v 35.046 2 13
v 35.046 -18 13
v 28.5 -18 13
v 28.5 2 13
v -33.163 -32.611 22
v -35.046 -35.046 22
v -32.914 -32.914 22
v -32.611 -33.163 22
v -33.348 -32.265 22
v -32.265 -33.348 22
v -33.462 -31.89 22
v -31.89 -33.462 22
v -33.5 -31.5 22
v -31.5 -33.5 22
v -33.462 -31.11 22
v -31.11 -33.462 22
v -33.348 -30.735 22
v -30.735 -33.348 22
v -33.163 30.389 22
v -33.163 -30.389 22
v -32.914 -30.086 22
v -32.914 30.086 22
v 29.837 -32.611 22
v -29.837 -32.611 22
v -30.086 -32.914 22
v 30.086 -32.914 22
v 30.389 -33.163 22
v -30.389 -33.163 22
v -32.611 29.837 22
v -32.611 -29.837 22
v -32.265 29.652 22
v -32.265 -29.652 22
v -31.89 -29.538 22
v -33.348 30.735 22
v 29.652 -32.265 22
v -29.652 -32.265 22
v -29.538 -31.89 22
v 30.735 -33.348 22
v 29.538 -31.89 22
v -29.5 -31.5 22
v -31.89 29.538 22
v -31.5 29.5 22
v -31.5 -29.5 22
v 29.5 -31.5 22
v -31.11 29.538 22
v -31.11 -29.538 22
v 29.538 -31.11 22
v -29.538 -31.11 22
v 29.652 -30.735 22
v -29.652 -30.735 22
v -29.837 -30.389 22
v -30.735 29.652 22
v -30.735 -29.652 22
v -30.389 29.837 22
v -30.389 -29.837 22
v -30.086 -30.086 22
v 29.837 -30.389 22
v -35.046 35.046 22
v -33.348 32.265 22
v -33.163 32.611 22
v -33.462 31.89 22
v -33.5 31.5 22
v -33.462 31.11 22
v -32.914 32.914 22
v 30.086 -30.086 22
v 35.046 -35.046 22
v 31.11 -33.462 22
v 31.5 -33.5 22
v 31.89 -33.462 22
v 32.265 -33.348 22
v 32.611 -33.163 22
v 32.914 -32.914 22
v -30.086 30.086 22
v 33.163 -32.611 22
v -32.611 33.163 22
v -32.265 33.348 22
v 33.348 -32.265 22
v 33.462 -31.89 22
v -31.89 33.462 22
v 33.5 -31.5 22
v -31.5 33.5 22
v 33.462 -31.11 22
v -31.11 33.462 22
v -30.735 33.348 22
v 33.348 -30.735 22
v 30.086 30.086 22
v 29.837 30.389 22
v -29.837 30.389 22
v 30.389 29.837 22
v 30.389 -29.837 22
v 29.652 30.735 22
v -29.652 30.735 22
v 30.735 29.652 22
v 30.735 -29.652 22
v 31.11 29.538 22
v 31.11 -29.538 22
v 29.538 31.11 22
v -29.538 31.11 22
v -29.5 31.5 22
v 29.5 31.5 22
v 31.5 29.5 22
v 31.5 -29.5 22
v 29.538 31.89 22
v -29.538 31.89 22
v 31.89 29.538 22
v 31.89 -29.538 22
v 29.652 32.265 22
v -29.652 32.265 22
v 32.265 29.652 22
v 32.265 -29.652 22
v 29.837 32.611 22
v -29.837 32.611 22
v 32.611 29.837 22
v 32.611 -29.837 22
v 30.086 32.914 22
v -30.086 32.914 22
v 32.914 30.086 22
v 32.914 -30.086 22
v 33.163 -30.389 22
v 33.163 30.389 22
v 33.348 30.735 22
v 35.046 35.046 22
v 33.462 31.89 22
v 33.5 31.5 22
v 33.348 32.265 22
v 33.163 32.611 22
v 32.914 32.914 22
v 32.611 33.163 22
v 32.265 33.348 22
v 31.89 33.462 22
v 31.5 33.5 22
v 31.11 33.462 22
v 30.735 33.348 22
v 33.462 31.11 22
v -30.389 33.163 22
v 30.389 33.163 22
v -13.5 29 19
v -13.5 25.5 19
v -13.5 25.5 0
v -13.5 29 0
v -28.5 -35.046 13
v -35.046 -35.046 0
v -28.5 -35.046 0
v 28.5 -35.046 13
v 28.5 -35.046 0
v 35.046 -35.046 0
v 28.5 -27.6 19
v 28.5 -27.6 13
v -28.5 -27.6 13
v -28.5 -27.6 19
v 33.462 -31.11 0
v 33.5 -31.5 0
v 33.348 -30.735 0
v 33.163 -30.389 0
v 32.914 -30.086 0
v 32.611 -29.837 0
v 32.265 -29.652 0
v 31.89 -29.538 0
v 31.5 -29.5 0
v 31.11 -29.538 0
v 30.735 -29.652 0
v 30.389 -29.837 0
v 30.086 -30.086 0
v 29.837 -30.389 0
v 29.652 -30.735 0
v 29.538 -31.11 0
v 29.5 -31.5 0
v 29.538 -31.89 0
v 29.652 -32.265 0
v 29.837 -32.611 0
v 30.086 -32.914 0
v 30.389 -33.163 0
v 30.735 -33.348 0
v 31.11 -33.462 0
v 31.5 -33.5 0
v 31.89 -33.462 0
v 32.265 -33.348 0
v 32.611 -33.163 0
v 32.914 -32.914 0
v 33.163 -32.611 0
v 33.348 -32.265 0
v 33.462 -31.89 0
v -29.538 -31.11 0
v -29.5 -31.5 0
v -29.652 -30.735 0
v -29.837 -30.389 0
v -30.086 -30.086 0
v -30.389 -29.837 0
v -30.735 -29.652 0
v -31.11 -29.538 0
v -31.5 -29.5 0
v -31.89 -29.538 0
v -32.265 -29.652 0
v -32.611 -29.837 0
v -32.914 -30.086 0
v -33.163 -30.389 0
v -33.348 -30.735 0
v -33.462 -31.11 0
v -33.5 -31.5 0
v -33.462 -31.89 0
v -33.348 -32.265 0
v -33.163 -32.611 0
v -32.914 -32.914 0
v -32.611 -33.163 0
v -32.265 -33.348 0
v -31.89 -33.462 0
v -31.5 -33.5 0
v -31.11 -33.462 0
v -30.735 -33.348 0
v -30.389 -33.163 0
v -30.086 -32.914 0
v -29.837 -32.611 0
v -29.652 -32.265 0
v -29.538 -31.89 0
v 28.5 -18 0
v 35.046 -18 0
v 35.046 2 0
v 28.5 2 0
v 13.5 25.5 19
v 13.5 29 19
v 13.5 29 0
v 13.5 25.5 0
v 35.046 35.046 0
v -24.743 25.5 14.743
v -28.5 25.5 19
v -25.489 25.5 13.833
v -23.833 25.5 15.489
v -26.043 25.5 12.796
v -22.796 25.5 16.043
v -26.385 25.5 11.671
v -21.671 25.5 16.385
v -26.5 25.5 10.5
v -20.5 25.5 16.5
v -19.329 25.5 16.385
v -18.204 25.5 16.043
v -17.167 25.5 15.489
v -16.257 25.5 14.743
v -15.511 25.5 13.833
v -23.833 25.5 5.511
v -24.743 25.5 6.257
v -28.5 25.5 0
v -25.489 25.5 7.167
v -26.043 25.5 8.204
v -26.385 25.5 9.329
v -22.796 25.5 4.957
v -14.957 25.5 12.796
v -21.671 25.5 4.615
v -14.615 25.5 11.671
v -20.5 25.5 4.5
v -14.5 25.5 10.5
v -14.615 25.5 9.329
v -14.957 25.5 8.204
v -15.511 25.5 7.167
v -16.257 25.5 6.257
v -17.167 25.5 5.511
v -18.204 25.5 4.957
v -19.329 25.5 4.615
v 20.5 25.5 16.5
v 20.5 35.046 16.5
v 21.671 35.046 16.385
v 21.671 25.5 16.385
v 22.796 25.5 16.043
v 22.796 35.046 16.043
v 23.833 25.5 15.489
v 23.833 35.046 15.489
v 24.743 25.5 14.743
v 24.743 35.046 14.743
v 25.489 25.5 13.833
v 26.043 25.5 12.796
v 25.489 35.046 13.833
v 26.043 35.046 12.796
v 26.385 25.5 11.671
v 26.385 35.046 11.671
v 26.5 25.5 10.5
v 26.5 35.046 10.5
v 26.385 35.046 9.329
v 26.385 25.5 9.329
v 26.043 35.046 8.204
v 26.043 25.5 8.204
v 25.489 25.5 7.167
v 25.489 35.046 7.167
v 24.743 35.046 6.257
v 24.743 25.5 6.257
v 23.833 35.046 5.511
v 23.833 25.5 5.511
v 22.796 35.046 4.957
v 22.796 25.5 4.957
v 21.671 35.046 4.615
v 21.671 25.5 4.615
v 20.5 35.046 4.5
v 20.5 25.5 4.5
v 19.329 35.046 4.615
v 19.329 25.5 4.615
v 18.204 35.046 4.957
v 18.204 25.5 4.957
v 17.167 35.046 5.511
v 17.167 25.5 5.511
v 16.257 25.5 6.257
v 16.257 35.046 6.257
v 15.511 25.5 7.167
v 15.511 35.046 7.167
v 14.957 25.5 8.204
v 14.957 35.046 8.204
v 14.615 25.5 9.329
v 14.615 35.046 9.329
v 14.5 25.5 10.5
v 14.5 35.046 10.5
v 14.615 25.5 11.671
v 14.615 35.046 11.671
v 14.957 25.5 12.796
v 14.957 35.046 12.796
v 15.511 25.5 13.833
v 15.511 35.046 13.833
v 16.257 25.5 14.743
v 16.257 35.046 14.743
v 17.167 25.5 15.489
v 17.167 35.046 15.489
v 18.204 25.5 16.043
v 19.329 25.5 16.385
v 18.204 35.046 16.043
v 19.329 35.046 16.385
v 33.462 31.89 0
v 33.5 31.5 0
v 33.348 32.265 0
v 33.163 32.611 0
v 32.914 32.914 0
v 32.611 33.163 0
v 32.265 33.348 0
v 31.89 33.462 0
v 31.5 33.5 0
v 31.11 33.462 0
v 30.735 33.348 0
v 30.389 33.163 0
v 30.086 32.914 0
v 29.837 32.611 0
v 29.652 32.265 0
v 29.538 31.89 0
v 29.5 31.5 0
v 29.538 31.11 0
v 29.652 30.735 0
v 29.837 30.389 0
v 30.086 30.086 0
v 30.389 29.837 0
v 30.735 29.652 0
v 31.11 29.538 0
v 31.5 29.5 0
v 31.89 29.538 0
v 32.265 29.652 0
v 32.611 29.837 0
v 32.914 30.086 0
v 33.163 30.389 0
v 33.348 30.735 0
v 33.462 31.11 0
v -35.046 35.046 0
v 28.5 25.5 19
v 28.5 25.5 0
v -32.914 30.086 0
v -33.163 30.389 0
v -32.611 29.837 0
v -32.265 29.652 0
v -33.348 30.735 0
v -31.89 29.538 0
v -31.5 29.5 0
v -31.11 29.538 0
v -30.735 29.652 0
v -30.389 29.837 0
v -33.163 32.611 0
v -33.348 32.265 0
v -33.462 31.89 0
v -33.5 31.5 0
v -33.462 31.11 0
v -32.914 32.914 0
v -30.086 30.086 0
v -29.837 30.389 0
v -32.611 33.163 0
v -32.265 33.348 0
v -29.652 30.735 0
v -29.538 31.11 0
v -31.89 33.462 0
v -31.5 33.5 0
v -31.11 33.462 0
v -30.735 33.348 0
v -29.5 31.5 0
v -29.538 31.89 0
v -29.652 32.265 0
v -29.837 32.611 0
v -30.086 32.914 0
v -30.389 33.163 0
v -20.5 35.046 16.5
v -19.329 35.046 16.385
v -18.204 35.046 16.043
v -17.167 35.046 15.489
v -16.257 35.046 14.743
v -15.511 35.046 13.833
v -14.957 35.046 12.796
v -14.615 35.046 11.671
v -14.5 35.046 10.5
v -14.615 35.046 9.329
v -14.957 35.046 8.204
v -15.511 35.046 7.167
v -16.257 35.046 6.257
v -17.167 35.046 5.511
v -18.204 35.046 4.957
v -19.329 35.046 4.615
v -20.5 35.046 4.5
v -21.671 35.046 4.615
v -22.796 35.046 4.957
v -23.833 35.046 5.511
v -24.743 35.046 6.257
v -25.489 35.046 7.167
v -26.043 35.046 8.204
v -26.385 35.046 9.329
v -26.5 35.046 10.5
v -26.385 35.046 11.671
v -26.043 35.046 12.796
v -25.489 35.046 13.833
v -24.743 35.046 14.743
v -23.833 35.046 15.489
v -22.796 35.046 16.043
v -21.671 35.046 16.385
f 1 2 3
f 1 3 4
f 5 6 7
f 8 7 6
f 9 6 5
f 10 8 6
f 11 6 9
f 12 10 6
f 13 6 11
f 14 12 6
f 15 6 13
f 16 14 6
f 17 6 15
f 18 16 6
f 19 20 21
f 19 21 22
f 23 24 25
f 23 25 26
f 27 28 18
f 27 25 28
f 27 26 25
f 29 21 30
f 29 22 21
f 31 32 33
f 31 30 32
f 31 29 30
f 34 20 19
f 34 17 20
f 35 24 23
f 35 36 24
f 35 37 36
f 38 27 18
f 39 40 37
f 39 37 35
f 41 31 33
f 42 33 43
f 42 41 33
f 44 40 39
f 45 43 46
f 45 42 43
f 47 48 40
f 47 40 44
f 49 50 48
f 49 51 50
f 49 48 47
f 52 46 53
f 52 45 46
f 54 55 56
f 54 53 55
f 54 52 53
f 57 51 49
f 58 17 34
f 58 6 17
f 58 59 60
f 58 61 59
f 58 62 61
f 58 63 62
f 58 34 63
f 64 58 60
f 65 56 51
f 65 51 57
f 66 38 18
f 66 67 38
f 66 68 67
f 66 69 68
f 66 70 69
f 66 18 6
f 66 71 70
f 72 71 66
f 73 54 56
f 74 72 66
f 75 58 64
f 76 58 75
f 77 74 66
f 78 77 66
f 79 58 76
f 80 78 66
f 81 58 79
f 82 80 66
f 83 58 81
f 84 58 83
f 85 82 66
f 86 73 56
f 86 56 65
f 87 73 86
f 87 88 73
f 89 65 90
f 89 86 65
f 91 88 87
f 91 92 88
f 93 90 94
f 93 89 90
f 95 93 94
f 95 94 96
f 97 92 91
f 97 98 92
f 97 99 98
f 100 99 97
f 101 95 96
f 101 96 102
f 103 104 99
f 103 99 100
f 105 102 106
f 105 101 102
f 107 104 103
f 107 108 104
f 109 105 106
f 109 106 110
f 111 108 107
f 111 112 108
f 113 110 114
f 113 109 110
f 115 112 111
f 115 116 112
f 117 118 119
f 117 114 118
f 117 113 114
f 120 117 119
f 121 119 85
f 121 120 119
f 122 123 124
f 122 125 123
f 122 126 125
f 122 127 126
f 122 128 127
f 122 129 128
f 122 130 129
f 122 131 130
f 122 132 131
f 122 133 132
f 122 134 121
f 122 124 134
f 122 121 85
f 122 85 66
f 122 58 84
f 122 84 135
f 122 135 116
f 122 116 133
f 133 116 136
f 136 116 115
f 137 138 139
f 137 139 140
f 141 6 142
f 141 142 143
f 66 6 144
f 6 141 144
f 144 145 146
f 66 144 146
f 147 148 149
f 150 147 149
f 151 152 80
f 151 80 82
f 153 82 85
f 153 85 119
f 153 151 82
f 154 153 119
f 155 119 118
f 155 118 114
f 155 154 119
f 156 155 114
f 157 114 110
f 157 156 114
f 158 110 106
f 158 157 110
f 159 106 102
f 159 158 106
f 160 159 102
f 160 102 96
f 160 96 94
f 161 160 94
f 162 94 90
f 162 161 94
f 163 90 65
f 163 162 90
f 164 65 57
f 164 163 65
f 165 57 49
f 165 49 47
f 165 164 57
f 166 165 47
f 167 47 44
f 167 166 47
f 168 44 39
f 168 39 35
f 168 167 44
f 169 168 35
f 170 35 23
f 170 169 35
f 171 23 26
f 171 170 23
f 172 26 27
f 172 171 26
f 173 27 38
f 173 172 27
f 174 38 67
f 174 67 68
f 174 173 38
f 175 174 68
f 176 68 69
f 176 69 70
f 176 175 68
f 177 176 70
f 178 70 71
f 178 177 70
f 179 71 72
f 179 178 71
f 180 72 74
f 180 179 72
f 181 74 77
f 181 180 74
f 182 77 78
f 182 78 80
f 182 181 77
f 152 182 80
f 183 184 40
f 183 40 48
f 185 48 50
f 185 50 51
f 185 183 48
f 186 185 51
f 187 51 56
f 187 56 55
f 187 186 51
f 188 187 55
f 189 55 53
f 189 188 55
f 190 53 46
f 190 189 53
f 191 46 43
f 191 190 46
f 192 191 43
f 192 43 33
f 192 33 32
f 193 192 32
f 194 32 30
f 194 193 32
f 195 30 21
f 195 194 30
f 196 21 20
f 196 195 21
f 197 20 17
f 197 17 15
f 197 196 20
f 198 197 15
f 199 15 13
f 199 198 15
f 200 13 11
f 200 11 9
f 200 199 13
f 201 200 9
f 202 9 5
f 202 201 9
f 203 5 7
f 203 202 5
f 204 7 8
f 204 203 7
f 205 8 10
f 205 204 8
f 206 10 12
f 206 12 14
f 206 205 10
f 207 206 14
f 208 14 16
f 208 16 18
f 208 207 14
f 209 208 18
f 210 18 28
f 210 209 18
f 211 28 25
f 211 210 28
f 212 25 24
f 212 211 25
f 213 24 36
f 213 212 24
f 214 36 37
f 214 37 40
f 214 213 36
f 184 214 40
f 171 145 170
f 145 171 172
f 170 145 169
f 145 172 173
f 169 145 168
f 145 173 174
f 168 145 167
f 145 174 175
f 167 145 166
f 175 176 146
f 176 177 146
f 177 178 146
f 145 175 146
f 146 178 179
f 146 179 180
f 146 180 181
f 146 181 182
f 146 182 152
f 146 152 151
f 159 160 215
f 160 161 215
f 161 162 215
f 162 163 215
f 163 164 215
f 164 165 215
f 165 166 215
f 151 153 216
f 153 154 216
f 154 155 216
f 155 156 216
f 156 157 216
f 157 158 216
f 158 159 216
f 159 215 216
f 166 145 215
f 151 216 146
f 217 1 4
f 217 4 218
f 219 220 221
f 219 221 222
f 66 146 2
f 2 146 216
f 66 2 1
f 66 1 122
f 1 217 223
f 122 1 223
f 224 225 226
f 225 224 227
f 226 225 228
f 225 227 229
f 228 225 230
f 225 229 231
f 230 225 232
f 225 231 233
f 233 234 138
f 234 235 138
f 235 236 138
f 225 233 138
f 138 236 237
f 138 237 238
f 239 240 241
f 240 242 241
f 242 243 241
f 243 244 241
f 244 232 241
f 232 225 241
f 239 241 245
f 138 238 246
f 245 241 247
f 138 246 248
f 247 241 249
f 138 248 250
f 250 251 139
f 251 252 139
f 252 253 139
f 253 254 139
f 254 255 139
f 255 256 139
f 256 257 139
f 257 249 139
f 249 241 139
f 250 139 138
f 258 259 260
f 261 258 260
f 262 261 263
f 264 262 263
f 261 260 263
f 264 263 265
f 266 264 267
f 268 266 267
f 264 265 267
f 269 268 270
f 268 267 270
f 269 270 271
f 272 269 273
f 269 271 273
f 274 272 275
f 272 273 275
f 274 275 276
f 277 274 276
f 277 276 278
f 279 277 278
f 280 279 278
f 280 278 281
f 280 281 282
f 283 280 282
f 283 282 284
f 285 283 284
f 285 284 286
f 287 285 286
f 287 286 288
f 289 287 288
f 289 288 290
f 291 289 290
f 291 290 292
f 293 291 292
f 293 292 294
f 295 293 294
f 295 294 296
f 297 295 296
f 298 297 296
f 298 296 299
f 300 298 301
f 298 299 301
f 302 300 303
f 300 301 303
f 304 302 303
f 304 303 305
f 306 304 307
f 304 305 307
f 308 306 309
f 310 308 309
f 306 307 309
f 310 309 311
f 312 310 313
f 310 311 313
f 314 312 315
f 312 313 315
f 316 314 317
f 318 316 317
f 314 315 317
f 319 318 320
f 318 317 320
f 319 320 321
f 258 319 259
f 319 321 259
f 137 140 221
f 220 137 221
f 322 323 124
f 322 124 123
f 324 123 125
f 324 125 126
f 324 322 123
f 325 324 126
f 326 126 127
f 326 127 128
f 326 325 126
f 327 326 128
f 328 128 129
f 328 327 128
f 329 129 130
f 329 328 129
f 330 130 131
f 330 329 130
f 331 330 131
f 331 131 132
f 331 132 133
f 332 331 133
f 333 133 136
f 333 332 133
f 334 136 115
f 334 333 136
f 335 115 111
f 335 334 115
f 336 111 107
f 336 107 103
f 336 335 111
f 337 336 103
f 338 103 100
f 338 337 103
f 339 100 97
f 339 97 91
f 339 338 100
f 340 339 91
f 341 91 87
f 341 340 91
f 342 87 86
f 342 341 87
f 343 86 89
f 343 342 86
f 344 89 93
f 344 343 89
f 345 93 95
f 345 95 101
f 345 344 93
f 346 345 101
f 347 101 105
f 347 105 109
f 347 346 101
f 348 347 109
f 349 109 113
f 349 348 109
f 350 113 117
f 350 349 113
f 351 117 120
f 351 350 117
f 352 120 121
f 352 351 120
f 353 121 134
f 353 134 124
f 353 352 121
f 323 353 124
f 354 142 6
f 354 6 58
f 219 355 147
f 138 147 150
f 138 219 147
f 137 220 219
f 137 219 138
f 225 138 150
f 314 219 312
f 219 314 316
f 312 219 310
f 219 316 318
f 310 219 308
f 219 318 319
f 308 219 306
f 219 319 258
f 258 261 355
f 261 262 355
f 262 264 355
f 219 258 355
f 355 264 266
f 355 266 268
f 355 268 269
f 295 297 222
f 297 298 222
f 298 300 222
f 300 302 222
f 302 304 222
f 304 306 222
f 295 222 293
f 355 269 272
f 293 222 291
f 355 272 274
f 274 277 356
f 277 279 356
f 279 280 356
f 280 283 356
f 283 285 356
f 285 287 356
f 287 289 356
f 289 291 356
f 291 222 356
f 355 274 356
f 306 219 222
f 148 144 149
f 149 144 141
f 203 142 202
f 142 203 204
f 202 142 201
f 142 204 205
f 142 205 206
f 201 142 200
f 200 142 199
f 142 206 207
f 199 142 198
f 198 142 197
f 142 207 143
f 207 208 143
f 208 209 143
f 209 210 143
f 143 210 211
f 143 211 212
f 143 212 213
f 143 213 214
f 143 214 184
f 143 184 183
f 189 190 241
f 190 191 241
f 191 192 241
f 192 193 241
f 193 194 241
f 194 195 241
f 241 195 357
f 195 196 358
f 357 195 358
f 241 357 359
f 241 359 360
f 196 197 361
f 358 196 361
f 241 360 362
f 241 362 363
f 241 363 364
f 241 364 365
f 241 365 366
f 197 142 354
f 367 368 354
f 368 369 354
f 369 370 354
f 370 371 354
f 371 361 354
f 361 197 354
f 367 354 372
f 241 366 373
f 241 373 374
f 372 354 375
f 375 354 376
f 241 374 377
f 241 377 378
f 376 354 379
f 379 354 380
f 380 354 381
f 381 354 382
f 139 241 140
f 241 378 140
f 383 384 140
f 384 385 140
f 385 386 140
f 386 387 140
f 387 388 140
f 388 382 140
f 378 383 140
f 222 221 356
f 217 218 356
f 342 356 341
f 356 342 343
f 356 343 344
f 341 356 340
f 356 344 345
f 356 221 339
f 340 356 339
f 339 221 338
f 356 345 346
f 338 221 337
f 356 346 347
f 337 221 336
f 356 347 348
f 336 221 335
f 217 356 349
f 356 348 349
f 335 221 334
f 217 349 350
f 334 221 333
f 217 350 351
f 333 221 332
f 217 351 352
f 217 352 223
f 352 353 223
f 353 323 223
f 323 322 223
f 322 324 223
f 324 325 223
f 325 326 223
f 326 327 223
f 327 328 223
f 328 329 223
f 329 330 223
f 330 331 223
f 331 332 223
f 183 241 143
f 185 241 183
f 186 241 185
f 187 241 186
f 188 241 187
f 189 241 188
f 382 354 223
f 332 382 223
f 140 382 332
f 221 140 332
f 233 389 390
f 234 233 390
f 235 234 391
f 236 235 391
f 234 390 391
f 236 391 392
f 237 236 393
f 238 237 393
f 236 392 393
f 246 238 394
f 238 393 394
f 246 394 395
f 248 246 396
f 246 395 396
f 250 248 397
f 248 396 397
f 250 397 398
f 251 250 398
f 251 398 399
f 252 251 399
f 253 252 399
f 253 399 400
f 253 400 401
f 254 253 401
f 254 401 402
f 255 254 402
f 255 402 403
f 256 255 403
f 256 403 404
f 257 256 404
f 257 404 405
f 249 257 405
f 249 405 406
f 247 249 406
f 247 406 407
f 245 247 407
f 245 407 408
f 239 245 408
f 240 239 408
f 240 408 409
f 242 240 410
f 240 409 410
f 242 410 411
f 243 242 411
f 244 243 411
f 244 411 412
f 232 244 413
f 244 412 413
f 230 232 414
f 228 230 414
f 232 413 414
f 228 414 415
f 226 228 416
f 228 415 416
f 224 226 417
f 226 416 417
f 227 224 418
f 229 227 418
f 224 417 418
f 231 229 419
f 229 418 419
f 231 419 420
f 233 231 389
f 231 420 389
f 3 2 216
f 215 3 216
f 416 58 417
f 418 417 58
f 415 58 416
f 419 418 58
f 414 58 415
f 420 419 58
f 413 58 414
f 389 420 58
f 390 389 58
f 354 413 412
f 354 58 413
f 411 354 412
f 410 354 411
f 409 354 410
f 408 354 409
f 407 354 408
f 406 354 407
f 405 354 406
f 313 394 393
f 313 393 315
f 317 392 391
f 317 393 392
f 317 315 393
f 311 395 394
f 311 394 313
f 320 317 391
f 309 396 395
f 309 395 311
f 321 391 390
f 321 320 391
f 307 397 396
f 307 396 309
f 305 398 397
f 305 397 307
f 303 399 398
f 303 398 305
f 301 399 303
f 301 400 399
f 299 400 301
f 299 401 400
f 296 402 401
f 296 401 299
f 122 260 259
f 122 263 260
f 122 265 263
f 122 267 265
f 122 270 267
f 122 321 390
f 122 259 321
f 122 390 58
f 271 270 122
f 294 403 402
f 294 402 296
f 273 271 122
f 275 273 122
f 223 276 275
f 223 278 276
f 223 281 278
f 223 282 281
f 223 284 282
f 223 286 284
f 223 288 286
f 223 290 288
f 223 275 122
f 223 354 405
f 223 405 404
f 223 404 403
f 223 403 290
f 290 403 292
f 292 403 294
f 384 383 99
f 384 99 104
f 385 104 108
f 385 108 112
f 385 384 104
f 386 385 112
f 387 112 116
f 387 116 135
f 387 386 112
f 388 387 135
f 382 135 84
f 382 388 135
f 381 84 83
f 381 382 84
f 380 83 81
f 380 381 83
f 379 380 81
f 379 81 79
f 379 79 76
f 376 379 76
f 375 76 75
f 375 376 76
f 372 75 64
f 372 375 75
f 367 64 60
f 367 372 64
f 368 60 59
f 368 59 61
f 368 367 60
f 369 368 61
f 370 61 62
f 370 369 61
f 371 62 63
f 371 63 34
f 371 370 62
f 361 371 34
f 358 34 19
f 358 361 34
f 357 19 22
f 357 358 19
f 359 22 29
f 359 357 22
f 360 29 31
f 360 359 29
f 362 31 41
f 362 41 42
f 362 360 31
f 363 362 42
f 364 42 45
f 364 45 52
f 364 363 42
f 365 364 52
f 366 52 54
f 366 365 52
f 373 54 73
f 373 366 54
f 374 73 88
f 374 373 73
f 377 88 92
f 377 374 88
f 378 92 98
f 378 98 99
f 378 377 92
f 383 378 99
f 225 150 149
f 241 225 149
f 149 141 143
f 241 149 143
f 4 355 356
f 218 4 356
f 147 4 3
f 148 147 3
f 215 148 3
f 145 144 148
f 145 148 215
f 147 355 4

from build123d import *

# Parameters (mm, degrees)
SKETCH_1_W          = 70.091778518
SKETCH_1_H          = 70.091778518
SKETCH_1_R          = 2
EXTRUDE_1_DEPTH     = 22
CUT_EXTRUDE_4_DEPTH = 19
SKETCH_4_R          = 6
CUT_EXTRUDE_5_DEPTH = 15
SKETCH_4_3_R        = 6
CUT_EXTRUDE_6_DEPTH = 15
SKETCH_5_W          = 13
SKETCH_5_H          = 20
CUT_EXTRUDE_7_DEPTH = 10
SKETCH_6_W          = 57
SKETCH_6_H          = 13
CUT_EXTRUDE_8_DEPTH = 16


with BuildPart() as part:
    # 草图1 → 凸台-拉伸1 (new body)
    with BuildSketch(Plane.XY):
        Rectangle(SKETCH_1_W, SKETCH_1_H)
        with Locations((-31.5, -31.5)):
            Circle(SKETCH_1_R, mode=Mode.SUBTRACT)
        with Locations((-31.5, 31.5)):
            Circle(SKETCH_1_R, mode=Mode.SUBTRACT)
        with Locations((31.5, 31.5)):
            Circle(SKETCH_1_R, mode=Mode.SUBTRACT)
        with Locations((31.5, -31.5)):
            Circle(SKETCH_1_R, mode=Mode.SUBTRACT)
    extrude(amount=EXTRUDE_1_DEPTH)

    # 草图2 → 切除-拉伸4 (cut)
    with BuildSketch(Plane.XY):
        Polygon((-28.5, 25.5), (-13.5, 25.5), (-13.5, 29), (13.5, 29), (13.5, 25.5), (28.5, 25.5), (28.5, -27.6), (-28.5, -27.6), align=None)
    extrude(amount=CUT_EXTRUDE_4_DEPTH, mode=Mode.SUBTRACT)

    # 草图4 → 切除-拉伸5 (cut)
    with BuildSketch(Plane(origin=(0, 35.045889259, 0), x_dir=(1, 0, 0), z_dir=(0, 1, 0))):
        with Locations((20.5, -10.5)):
            Circle(SKETCH_4_R)
    extrude(amount=-CUT_EXTRUDE_5_DEPTH, mode=Mode.SUBTRACT)

    # 草图4<3> → 切除-拉伸6 (cut)
    with BuildSketch(Plane(origin=(0, 35.045889259, 0), x_dir=(1, 0, 0), z_dir=(0, 1, 0))):
        with Locations((20.5, -10.5)):
            Circle(SKETCH_4_3_R)
        with Locations((-20.5, -10.5)):
            Circle(SKETCH_4_3_R)
    extrude(amount=-CUT_EXTRUDE_6_DEPTH, mode=Mode.SUBTRACT)

    # 草图5 → 切除-拉伸7 (cut)
    with BuildSketch(Plane(origin=(35.045889259, 0, 0), x_dir=(0, 0, -1), z_dir=(1, 0, 0))):
        with Locations((-6.5, -8)):
            Rectangle(SKETCH_5_W, SKETCH_5_H)
    extrude(amount=-CUT_EXTRUDE_7_DEPTH, mode=Mode.SUBTRACT)

    # 草图6 → 切除-拉伸8 (cut)
    with BuildSketch(Plane(origin=(0, -35.045889259, 0), x_dir=(-1, 0, 0), z_dir=(0, -1, 0))):
        with Locations((0, -6.5)):
            Rectangle(SKETCH_6_W, SKETCH_6_H)
    extrude(amount=-CUT_EXTRUDE_8_DEPTH, mode=Mode.SUBTRACT)


solid = part.part
